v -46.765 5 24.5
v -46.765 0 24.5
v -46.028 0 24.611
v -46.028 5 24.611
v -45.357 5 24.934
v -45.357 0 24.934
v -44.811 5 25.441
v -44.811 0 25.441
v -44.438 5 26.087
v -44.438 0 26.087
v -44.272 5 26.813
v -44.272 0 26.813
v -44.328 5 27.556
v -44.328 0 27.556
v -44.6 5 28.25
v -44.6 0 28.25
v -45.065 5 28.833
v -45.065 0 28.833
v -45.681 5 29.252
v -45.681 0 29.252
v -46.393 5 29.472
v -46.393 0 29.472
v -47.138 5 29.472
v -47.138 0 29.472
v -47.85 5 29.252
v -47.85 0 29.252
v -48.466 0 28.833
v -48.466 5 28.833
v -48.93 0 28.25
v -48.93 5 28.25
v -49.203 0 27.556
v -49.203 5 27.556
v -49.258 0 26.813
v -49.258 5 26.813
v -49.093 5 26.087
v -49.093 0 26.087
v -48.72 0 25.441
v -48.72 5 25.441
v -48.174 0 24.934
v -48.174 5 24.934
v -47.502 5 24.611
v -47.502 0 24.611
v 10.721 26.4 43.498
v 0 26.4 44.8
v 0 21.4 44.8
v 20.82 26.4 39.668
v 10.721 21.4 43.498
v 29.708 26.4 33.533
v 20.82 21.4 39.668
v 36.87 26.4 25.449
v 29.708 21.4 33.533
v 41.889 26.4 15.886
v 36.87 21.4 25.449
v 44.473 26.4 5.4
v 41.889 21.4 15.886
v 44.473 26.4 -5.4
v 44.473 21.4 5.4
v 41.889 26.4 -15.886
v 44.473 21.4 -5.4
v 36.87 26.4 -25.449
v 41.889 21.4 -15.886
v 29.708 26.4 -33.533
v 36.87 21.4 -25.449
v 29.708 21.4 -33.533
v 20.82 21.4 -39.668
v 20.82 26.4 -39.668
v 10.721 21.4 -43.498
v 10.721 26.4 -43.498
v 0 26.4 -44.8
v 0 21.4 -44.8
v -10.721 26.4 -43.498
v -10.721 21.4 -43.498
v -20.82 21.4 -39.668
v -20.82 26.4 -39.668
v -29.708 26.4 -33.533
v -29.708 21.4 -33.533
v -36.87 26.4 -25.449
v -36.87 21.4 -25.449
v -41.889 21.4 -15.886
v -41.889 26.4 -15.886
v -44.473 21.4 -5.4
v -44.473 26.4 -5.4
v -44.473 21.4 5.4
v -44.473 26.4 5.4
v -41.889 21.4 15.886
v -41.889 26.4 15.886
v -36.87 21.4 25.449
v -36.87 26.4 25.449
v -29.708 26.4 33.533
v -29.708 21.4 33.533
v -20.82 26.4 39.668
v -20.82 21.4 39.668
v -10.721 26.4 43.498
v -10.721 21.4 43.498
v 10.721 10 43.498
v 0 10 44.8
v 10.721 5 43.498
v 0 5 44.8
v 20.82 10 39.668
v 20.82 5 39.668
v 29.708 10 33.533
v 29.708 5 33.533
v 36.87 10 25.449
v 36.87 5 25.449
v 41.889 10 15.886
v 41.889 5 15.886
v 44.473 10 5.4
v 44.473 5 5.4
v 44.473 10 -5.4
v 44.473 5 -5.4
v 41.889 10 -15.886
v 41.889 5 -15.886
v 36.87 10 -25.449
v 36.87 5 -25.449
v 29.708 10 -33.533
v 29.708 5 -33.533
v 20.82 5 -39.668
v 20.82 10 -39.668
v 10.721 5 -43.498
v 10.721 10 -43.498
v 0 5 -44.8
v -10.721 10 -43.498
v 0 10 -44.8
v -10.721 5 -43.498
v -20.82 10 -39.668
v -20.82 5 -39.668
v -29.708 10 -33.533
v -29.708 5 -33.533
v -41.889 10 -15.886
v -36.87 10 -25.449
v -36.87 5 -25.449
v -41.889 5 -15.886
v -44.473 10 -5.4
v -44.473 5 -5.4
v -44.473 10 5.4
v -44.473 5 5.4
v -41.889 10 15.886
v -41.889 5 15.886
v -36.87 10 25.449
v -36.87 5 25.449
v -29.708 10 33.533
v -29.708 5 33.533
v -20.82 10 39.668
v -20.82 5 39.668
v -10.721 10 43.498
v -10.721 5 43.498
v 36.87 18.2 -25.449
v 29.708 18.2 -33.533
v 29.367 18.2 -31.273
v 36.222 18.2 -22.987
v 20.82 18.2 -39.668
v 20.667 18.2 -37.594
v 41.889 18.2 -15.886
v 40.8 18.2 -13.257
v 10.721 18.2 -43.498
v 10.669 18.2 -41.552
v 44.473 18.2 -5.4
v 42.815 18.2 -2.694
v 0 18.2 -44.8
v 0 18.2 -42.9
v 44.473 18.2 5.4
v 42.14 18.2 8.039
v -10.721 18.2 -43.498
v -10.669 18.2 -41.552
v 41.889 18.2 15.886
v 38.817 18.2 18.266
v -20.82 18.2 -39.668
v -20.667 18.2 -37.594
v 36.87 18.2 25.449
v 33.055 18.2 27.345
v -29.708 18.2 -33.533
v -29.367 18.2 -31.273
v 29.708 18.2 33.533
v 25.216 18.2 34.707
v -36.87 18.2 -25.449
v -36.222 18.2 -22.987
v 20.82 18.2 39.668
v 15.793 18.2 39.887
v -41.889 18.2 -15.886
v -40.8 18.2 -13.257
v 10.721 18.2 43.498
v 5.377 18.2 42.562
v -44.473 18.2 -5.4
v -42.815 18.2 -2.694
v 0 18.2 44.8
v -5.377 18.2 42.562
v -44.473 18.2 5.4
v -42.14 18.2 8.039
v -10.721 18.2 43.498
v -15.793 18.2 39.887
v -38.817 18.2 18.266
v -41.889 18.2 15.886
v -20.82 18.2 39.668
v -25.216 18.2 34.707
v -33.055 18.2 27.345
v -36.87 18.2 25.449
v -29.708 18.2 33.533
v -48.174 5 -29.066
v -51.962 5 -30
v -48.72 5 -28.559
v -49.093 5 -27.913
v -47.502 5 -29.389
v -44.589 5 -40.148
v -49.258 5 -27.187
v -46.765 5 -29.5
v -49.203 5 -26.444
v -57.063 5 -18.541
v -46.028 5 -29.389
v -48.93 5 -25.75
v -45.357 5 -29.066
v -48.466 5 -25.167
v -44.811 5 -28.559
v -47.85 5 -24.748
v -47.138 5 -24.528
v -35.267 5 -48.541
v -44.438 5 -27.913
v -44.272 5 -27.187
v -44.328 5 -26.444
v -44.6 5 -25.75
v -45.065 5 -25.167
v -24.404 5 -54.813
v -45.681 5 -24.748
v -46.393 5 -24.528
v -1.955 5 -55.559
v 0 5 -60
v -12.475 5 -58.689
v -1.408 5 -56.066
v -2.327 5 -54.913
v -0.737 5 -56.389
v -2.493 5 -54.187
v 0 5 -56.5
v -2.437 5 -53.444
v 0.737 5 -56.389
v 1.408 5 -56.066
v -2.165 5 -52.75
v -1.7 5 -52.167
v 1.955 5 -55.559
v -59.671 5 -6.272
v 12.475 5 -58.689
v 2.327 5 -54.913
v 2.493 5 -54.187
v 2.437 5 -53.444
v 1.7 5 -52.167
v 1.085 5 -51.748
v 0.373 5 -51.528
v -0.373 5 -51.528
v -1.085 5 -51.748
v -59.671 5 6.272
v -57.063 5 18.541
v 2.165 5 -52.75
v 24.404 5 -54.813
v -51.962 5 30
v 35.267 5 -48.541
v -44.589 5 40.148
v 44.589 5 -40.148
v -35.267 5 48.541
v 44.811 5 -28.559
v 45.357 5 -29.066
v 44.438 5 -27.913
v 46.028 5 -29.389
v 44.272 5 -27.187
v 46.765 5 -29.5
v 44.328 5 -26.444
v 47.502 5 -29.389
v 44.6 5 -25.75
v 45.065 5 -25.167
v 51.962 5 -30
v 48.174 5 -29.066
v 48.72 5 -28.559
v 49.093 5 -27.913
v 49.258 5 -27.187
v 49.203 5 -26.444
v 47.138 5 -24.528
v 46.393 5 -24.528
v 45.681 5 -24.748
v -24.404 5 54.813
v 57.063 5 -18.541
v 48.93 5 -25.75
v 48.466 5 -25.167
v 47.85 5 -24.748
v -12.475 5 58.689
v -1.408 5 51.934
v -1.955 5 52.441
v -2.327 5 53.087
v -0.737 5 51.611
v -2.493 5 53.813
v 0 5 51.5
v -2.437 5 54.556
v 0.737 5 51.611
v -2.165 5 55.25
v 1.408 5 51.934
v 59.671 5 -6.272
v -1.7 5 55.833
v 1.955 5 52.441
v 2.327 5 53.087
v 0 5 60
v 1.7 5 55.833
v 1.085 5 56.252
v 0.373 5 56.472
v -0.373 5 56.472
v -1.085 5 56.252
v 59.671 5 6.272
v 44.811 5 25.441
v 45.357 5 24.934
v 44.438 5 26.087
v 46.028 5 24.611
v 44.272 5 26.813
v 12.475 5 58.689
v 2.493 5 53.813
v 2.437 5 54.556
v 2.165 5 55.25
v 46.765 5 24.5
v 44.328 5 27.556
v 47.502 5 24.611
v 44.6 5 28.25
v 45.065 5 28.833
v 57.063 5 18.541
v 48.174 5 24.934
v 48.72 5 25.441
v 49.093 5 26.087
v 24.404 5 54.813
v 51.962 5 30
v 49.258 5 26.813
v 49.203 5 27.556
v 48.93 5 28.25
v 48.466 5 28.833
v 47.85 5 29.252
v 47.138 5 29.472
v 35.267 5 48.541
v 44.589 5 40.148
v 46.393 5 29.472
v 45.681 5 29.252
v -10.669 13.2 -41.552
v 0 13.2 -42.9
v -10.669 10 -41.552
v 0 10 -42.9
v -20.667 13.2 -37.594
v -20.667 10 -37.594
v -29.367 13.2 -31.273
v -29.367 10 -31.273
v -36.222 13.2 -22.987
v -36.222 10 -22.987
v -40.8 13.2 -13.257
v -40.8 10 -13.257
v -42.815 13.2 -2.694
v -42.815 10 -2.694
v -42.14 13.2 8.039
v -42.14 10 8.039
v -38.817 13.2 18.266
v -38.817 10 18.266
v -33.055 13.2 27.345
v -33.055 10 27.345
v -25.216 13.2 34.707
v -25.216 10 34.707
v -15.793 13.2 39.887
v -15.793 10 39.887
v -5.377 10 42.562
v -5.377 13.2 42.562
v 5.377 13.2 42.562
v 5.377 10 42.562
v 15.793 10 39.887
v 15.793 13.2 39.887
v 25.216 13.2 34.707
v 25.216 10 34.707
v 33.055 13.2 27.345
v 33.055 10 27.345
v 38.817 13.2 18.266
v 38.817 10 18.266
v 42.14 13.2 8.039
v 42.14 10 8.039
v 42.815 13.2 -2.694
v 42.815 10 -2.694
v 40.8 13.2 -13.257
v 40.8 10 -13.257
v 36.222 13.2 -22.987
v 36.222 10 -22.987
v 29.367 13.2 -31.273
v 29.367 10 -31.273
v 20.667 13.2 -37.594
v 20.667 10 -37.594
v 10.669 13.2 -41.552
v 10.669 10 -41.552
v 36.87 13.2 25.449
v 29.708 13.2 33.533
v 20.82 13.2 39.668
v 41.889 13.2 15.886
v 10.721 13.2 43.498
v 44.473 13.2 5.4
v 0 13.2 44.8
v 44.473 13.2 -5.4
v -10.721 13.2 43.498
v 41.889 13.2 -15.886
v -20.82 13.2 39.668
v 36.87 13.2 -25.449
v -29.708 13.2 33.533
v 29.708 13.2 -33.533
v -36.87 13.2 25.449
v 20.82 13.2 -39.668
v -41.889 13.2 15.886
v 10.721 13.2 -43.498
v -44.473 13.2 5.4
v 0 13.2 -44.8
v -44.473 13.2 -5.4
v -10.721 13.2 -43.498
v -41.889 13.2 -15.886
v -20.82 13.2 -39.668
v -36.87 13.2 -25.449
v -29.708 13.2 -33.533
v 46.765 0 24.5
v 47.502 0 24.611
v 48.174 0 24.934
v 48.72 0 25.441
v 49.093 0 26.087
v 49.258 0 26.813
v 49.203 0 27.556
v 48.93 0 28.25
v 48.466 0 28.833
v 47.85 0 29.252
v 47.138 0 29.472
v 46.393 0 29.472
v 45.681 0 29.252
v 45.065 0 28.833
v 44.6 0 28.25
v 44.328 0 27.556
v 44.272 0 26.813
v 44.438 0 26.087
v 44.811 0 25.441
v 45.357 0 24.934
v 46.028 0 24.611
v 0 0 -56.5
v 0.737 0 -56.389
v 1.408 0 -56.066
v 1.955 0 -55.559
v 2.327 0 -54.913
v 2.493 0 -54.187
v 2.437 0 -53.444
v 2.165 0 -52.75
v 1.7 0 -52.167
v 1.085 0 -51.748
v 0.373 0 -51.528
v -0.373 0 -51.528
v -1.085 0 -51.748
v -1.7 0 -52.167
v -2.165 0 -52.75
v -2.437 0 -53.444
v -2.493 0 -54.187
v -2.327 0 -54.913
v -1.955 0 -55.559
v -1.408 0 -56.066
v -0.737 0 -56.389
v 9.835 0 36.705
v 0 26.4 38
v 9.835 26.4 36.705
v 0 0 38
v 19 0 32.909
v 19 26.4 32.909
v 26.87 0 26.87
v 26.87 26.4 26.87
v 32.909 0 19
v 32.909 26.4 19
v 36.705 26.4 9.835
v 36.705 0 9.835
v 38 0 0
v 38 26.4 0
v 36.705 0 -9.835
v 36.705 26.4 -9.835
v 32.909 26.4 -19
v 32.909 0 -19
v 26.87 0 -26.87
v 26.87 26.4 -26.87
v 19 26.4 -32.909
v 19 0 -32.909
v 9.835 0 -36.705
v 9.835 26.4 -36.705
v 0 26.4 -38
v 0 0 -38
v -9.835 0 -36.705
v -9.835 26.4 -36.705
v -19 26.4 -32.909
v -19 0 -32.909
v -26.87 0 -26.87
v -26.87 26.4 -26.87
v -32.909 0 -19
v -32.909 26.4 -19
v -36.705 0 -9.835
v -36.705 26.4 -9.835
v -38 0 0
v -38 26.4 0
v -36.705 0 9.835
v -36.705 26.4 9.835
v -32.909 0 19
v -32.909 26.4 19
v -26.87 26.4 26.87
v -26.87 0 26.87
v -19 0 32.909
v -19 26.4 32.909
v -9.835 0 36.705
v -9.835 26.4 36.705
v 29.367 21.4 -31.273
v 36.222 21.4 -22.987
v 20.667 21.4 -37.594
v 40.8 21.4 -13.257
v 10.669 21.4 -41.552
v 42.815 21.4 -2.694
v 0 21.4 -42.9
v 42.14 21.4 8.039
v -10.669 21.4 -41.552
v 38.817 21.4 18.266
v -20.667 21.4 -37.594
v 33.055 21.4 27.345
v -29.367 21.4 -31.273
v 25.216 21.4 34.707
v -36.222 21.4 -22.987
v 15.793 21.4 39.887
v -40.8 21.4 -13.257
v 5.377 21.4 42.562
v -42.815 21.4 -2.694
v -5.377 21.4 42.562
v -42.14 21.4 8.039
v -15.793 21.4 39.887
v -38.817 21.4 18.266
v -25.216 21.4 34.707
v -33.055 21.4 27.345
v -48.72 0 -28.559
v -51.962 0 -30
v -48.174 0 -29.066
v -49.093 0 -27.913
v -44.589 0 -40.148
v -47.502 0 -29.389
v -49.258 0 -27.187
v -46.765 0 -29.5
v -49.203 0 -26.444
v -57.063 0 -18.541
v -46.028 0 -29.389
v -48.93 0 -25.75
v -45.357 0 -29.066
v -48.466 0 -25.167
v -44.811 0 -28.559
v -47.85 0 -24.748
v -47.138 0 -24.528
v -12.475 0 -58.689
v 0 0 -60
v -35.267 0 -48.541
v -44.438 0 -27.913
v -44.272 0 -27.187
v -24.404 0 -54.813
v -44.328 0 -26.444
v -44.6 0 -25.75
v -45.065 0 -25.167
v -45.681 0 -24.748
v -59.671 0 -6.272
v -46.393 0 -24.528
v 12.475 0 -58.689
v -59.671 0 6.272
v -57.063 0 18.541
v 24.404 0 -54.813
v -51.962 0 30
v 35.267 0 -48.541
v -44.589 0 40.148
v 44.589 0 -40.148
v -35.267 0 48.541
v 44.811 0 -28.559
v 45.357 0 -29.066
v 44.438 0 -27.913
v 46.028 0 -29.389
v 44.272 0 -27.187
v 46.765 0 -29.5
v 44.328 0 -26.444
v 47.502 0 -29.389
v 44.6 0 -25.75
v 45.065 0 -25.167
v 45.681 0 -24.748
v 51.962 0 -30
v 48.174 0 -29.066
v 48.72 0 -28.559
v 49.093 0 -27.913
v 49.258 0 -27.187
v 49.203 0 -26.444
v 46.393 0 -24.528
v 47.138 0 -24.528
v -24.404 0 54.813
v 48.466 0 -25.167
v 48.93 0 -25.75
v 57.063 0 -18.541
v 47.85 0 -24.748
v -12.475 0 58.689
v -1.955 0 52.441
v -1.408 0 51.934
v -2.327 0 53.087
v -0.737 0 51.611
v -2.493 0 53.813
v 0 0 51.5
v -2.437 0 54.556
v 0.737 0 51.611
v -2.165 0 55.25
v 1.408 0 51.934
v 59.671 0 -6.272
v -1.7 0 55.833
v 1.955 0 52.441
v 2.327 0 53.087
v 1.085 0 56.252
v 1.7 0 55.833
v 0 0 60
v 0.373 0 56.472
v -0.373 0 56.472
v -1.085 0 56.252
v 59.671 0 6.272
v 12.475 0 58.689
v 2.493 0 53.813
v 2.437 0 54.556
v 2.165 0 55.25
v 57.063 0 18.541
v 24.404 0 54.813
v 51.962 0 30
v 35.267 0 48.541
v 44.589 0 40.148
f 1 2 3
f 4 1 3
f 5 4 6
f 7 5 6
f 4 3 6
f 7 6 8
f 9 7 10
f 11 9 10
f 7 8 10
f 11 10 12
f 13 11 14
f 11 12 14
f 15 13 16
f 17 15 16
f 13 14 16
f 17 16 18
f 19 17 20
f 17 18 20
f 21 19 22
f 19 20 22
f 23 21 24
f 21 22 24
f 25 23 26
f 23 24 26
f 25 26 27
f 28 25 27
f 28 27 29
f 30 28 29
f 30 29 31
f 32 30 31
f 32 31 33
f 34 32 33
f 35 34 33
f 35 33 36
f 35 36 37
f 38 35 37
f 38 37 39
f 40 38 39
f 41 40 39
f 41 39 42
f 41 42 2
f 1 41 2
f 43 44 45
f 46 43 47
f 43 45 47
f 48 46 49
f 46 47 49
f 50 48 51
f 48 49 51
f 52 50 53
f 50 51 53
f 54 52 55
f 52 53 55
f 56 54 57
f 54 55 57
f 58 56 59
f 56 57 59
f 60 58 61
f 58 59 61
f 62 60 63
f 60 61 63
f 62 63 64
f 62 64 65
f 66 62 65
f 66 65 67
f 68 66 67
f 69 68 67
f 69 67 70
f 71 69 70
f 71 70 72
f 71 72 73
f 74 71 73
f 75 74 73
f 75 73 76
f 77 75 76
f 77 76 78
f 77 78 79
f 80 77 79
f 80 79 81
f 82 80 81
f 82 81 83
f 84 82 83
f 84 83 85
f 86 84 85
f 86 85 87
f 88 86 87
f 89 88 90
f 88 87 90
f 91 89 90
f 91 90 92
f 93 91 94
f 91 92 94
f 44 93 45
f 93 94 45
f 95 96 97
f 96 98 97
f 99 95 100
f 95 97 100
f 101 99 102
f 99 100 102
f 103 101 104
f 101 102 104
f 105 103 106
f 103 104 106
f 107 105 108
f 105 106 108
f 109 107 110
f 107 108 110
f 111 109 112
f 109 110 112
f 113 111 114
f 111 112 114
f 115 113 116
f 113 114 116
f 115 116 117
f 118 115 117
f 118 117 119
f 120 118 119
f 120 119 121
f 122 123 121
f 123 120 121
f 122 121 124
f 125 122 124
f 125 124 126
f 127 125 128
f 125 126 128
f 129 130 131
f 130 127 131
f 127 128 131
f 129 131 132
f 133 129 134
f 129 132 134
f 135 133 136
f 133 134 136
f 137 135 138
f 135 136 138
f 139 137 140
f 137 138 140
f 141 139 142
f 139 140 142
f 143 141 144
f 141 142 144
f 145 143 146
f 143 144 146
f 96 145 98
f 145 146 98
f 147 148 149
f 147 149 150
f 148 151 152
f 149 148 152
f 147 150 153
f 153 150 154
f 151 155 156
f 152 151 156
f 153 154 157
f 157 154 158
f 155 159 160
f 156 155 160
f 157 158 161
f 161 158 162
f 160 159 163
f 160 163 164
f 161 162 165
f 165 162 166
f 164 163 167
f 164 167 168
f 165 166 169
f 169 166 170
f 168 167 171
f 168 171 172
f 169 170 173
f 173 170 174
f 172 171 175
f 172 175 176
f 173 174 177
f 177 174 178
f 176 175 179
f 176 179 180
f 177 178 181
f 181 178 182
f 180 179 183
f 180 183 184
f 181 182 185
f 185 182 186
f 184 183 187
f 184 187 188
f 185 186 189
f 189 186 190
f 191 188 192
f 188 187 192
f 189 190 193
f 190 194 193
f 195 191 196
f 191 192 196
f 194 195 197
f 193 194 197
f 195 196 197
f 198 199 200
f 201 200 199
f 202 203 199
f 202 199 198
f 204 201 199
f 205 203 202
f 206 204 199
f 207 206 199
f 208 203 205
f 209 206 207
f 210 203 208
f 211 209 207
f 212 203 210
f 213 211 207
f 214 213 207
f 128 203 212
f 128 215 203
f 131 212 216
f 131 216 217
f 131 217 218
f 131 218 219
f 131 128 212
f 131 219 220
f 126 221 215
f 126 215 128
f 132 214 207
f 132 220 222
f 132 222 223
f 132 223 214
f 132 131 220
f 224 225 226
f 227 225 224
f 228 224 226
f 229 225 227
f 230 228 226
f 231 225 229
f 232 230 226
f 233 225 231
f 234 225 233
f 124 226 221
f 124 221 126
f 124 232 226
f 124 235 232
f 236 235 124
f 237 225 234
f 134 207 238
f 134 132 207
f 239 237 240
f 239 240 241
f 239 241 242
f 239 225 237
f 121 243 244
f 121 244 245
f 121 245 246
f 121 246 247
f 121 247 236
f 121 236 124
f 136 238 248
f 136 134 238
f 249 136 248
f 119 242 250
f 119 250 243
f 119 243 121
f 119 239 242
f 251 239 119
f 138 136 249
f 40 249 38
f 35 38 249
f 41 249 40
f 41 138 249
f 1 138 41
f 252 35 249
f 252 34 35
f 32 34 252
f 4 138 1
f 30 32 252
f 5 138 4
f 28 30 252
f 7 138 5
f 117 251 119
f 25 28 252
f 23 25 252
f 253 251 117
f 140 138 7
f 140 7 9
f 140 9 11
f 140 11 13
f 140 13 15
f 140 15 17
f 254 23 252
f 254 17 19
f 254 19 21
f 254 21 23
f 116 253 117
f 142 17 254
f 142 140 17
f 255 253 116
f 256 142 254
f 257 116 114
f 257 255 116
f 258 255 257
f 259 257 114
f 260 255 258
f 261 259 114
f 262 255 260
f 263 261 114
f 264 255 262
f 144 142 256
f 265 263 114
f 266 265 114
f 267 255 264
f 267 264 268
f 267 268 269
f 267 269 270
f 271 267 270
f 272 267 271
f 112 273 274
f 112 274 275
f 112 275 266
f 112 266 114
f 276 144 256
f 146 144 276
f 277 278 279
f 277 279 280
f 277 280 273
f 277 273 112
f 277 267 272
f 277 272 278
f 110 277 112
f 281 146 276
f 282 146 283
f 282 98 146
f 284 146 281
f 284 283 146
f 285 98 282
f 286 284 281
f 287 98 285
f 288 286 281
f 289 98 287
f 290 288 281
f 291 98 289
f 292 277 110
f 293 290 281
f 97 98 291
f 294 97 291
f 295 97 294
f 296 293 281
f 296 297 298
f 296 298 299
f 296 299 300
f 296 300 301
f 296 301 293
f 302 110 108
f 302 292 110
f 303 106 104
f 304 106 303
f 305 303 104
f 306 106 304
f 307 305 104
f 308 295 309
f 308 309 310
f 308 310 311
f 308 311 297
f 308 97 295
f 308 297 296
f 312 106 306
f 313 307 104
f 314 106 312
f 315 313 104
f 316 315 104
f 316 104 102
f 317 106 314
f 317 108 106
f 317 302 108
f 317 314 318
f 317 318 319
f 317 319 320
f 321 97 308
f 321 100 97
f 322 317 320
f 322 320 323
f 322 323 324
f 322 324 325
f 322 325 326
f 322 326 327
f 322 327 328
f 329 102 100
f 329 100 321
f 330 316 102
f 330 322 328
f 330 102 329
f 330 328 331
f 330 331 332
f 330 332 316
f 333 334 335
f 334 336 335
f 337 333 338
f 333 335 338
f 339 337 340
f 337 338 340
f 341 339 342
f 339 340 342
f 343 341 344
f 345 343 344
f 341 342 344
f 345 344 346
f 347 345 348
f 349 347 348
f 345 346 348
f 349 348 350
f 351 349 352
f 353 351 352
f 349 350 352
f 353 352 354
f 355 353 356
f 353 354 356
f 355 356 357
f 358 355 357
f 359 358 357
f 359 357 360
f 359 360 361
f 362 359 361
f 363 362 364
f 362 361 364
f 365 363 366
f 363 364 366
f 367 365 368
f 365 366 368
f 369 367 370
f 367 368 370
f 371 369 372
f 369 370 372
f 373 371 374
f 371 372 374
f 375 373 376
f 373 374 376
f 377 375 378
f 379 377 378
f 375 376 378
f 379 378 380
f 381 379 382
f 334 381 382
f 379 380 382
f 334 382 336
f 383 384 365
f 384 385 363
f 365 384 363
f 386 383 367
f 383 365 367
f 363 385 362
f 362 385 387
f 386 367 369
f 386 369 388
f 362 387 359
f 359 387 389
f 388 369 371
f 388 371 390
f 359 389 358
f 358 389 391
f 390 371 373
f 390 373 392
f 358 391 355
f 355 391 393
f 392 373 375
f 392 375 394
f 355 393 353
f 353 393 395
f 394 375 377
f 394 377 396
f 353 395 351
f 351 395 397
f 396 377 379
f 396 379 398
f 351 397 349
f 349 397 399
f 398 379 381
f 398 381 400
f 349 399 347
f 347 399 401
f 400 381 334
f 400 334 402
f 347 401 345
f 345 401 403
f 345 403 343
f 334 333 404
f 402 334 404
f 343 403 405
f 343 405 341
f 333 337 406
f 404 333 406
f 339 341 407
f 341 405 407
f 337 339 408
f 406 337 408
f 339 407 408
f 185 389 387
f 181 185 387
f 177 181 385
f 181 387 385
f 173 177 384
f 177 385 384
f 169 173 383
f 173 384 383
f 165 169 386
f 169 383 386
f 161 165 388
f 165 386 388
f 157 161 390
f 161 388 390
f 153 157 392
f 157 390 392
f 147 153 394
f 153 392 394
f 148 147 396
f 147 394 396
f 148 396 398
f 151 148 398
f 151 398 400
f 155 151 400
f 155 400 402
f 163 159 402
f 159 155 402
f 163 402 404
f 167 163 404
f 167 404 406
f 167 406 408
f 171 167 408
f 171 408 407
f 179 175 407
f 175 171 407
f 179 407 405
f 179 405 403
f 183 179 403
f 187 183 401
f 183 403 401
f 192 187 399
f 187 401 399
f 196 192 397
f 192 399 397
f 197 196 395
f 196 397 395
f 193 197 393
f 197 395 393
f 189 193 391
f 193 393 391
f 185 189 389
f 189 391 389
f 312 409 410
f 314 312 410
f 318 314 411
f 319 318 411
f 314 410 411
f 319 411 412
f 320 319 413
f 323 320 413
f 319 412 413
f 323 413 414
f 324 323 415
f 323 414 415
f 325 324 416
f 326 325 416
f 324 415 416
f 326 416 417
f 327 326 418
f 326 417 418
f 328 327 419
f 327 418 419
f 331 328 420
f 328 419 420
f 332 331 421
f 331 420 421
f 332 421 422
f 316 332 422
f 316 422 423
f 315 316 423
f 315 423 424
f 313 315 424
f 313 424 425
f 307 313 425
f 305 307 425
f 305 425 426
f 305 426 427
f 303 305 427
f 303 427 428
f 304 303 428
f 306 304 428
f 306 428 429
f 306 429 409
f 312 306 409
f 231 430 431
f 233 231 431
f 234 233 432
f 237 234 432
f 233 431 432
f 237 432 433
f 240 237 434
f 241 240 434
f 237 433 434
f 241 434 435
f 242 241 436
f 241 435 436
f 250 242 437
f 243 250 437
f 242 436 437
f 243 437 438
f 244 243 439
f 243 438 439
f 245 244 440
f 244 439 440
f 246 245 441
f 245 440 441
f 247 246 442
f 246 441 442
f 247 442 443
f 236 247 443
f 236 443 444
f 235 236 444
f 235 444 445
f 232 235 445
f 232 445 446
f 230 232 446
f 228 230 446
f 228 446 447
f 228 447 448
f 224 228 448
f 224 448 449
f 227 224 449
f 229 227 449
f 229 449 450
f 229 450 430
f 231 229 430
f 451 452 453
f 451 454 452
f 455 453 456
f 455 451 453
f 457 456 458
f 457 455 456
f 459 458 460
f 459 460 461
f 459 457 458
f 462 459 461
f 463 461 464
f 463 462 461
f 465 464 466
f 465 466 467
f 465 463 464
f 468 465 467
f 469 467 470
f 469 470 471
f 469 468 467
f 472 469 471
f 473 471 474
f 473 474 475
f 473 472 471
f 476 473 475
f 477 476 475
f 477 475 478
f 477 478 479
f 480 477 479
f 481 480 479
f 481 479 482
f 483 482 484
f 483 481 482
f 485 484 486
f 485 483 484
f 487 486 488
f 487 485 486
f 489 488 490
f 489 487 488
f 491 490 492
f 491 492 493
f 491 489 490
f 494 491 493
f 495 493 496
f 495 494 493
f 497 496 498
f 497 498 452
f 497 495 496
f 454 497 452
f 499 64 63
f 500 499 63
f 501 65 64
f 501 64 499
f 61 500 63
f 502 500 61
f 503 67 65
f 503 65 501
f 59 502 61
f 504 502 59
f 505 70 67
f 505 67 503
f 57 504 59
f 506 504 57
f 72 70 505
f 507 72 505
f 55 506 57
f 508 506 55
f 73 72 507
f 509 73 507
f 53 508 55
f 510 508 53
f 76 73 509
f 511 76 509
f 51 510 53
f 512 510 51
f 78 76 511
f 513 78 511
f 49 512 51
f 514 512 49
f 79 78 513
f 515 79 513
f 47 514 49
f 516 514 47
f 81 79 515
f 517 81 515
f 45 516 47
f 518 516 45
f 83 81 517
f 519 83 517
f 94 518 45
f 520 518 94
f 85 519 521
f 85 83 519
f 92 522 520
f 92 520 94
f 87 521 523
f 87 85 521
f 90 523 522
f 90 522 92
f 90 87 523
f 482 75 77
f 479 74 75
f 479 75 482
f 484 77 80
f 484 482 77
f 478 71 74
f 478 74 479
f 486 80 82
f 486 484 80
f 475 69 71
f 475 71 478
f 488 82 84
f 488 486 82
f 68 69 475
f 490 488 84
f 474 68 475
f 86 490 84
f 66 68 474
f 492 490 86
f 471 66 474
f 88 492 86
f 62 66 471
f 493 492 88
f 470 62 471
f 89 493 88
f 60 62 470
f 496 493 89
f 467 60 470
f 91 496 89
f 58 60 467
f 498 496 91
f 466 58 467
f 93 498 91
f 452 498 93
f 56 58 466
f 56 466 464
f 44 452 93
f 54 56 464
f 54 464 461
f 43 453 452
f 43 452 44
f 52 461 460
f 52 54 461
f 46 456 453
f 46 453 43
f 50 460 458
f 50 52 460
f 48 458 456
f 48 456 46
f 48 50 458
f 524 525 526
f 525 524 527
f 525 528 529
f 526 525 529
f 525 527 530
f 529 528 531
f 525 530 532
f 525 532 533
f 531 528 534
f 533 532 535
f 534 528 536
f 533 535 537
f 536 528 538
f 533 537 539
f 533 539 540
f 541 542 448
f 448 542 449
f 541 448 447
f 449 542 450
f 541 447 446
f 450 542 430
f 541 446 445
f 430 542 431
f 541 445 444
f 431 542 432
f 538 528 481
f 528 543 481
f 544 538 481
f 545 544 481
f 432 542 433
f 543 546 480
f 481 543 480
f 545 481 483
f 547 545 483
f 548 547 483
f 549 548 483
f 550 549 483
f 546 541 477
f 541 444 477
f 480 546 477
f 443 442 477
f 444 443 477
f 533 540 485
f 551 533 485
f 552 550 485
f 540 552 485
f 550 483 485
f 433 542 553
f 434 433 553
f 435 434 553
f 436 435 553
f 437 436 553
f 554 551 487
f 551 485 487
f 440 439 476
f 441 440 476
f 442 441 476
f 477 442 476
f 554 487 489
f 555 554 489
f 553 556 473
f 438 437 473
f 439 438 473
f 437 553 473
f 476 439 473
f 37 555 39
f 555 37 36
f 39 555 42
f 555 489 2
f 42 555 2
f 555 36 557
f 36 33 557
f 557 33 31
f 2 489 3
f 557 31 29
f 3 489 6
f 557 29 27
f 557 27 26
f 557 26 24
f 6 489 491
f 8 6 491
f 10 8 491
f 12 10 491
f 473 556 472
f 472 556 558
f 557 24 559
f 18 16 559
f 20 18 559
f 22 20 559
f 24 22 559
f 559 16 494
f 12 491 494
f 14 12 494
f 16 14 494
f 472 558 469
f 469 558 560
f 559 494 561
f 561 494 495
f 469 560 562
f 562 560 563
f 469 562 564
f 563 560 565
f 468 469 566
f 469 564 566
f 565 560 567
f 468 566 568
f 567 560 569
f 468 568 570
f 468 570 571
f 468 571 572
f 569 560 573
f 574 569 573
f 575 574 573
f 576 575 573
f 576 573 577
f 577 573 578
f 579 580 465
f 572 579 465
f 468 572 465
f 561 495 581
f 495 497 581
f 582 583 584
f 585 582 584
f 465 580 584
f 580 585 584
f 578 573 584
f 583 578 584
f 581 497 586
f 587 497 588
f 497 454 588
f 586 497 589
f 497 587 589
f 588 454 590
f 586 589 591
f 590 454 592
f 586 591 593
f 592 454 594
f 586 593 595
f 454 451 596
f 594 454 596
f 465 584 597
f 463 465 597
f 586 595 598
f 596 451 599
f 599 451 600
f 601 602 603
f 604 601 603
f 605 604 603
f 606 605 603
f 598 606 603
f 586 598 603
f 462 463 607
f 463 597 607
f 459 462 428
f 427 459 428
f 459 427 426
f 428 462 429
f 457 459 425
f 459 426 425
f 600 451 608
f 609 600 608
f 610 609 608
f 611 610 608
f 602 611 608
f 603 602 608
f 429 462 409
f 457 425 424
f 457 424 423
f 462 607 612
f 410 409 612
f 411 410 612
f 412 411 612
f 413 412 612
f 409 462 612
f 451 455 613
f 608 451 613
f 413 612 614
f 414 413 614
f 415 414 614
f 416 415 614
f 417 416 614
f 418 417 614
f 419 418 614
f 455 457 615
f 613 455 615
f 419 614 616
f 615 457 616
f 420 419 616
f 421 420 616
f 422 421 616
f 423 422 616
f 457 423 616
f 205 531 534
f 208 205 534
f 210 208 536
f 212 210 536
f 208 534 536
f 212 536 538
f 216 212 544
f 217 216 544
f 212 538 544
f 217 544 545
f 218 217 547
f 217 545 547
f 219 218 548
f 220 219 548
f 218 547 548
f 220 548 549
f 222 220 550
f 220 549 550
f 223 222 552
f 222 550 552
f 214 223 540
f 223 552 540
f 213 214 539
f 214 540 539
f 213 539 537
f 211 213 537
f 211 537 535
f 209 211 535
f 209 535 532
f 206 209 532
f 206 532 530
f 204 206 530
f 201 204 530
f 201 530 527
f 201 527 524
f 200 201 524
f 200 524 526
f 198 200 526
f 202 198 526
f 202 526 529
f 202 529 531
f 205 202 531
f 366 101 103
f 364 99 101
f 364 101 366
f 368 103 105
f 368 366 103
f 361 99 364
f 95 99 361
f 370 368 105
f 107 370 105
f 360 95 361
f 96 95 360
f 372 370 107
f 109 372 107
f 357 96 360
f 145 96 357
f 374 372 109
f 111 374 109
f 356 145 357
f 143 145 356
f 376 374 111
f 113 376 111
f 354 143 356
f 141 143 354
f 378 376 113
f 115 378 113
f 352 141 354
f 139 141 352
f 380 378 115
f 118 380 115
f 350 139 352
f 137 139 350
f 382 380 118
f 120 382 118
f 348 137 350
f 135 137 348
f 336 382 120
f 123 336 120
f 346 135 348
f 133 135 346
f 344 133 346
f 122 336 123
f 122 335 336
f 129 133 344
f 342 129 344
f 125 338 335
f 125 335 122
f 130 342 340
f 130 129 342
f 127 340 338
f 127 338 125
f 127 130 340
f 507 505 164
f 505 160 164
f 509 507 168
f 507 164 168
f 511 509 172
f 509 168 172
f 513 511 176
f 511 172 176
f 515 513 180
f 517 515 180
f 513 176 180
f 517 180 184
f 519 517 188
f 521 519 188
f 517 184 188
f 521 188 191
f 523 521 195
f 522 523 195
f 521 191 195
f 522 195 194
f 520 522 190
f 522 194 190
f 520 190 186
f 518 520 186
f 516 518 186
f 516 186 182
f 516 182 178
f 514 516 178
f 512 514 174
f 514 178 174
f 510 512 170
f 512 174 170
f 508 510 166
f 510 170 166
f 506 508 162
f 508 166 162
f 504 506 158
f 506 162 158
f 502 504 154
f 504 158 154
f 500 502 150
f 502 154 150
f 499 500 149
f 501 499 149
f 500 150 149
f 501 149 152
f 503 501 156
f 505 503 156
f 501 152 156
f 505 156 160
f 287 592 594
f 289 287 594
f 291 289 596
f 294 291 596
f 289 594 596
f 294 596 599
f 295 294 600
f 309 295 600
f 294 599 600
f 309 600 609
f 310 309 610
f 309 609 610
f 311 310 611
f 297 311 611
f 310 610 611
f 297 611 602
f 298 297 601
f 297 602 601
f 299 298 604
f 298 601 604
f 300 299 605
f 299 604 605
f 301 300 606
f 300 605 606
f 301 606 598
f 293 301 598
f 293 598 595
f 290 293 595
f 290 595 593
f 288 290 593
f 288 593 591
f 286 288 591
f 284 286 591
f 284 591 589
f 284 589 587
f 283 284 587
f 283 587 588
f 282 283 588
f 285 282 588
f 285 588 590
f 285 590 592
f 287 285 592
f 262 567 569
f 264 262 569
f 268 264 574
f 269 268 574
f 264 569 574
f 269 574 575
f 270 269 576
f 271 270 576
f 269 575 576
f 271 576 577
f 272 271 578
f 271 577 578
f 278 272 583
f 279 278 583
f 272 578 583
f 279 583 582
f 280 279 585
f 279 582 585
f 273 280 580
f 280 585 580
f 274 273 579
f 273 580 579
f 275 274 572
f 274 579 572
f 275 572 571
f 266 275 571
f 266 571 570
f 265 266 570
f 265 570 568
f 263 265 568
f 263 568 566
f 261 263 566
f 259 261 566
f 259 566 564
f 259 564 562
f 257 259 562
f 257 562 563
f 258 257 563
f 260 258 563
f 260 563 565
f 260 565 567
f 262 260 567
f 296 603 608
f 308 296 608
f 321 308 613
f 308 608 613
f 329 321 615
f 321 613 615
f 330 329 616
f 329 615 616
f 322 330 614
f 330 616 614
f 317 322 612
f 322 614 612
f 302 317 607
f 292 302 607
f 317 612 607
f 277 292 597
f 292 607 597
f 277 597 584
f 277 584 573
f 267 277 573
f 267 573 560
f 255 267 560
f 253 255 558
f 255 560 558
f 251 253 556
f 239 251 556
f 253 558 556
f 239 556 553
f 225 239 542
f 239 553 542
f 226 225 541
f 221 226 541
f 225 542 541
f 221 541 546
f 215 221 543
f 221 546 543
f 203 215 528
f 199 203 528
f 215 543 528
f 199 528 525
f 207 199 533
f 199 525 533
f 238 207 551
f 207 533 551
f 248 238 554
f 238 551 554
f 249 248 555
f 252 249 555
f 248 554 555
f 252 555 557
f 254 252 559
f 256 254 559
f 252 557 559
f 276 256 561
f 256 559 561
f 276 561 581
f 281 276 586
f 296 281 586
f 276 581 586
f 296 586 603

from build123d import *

# Parameters (mm, degrees)
SKETCH1_R           = 60
SKETCH1_R_2         = 38
BOSS_EXTRUDE1_DEPTH = 5
SKETCH2_R           = 44.8
SKETCH2_R_2         = 38
BOSS_EXTRUDE2_DEPTH = 21.4
SKETCH4_R           = 2.5
CUT_EXTRUDE1_DEPTH  = 20


with BuildPart() as part:
    # Sketch1 → Boss-Extrude1 (new body)
    with BuildSketch(Plane(origin=(0, 0, 0), x_dir=(1, 0, 0), z_dir=(0, 1, 0))):
        with Locations(Location((0, 0, 0), (0, 0, 270))):
            Circle(SKETCH1_R)
        with Locations(Location((0, 0, 0), (0, 0, 270))):
            Circle(SKETCH1_R_2, mode=Mode.SUBTRACT)
    extrude(amount=BOSS_EXTRUDE1_DEPTH)

    # Sketch2 → Boss-Extrude2 (add)
    with BuildSketch(Plane(origin=(0, 5, 0), x_dir=(1, 0, 0), z_dir=(0, 1, 0))):
        with Locations(Location((0, 0, 0), (0, 0, 270))):
            Circle(SKETCH2_R)
        with Locations(Location((0, 0, 0), (0, 0, 270))):
            Circle(SKETCH2_R_2, mode=Mode.SUBTRACT)
    extrude(amount=BOSS_EXTRUDE2_DEPTH)

    # Sketch3 → Cut-Revolve1 (revolve, cut)
    with BuildSketch(Plane(origin=(0, 0, 0), x_dir=(0, 0, -1), z_dir=(1, 0, 0)), mode=Mode.PRIVATE) as cut_revolve1_sk:
        Polygon((-45.972863263, 10), (-45.972863263, 18.2), (-45.972863263, 21.4), (-44.8, 21.4), (-42.9, 21.4), (-42.9, 18.2), (-44.8, 18.2), (-44.8, 13.2), (-42.9, 13.2), (-42.9, 10), (-44.8, 10), align=None)
    revolve(cut_revolve1_sk.sketch.rotate(Axis((0, 0, 0), (0, 1, 0)), 180), axis=Axis((0, 0, 0), (0, 1, 0)), mode=Mode.SUBTRACT)

    # Sketch4 → Cut-Extrude1 (cut)
    with BuildSketch(Plane.XZ):
        with Locations(Location((0, 54, 0), (0, 0, 270))):
            Circle(SKETCH4_R)
        with Locations(Location((46.765371804, 27, 0), (0, 0, 270))):
            Circle(SKETCH4_R)
        with Locations(Location((46.765371804, -27, 0), (0, 0, 270))):
            Circle(SKETCH4_R)
        with Locations(Location((0, -54, 0), (0, 0, 270))):
            Circle(SKETCH4_R)
        with Locations(Location((-46.765371804, -27, 0), (0, 0, 270))):
            Circle(SKETCH4_R)
        with Locations(Location((-46.765371804, 27, 0), (0, 0, 270))):
            Circle(SKETCH4_R)
    extrude(amount=-CUT_EXTRUDE1_DEPTH, mode=Mode.SUBTRACT)


solid = part.part
